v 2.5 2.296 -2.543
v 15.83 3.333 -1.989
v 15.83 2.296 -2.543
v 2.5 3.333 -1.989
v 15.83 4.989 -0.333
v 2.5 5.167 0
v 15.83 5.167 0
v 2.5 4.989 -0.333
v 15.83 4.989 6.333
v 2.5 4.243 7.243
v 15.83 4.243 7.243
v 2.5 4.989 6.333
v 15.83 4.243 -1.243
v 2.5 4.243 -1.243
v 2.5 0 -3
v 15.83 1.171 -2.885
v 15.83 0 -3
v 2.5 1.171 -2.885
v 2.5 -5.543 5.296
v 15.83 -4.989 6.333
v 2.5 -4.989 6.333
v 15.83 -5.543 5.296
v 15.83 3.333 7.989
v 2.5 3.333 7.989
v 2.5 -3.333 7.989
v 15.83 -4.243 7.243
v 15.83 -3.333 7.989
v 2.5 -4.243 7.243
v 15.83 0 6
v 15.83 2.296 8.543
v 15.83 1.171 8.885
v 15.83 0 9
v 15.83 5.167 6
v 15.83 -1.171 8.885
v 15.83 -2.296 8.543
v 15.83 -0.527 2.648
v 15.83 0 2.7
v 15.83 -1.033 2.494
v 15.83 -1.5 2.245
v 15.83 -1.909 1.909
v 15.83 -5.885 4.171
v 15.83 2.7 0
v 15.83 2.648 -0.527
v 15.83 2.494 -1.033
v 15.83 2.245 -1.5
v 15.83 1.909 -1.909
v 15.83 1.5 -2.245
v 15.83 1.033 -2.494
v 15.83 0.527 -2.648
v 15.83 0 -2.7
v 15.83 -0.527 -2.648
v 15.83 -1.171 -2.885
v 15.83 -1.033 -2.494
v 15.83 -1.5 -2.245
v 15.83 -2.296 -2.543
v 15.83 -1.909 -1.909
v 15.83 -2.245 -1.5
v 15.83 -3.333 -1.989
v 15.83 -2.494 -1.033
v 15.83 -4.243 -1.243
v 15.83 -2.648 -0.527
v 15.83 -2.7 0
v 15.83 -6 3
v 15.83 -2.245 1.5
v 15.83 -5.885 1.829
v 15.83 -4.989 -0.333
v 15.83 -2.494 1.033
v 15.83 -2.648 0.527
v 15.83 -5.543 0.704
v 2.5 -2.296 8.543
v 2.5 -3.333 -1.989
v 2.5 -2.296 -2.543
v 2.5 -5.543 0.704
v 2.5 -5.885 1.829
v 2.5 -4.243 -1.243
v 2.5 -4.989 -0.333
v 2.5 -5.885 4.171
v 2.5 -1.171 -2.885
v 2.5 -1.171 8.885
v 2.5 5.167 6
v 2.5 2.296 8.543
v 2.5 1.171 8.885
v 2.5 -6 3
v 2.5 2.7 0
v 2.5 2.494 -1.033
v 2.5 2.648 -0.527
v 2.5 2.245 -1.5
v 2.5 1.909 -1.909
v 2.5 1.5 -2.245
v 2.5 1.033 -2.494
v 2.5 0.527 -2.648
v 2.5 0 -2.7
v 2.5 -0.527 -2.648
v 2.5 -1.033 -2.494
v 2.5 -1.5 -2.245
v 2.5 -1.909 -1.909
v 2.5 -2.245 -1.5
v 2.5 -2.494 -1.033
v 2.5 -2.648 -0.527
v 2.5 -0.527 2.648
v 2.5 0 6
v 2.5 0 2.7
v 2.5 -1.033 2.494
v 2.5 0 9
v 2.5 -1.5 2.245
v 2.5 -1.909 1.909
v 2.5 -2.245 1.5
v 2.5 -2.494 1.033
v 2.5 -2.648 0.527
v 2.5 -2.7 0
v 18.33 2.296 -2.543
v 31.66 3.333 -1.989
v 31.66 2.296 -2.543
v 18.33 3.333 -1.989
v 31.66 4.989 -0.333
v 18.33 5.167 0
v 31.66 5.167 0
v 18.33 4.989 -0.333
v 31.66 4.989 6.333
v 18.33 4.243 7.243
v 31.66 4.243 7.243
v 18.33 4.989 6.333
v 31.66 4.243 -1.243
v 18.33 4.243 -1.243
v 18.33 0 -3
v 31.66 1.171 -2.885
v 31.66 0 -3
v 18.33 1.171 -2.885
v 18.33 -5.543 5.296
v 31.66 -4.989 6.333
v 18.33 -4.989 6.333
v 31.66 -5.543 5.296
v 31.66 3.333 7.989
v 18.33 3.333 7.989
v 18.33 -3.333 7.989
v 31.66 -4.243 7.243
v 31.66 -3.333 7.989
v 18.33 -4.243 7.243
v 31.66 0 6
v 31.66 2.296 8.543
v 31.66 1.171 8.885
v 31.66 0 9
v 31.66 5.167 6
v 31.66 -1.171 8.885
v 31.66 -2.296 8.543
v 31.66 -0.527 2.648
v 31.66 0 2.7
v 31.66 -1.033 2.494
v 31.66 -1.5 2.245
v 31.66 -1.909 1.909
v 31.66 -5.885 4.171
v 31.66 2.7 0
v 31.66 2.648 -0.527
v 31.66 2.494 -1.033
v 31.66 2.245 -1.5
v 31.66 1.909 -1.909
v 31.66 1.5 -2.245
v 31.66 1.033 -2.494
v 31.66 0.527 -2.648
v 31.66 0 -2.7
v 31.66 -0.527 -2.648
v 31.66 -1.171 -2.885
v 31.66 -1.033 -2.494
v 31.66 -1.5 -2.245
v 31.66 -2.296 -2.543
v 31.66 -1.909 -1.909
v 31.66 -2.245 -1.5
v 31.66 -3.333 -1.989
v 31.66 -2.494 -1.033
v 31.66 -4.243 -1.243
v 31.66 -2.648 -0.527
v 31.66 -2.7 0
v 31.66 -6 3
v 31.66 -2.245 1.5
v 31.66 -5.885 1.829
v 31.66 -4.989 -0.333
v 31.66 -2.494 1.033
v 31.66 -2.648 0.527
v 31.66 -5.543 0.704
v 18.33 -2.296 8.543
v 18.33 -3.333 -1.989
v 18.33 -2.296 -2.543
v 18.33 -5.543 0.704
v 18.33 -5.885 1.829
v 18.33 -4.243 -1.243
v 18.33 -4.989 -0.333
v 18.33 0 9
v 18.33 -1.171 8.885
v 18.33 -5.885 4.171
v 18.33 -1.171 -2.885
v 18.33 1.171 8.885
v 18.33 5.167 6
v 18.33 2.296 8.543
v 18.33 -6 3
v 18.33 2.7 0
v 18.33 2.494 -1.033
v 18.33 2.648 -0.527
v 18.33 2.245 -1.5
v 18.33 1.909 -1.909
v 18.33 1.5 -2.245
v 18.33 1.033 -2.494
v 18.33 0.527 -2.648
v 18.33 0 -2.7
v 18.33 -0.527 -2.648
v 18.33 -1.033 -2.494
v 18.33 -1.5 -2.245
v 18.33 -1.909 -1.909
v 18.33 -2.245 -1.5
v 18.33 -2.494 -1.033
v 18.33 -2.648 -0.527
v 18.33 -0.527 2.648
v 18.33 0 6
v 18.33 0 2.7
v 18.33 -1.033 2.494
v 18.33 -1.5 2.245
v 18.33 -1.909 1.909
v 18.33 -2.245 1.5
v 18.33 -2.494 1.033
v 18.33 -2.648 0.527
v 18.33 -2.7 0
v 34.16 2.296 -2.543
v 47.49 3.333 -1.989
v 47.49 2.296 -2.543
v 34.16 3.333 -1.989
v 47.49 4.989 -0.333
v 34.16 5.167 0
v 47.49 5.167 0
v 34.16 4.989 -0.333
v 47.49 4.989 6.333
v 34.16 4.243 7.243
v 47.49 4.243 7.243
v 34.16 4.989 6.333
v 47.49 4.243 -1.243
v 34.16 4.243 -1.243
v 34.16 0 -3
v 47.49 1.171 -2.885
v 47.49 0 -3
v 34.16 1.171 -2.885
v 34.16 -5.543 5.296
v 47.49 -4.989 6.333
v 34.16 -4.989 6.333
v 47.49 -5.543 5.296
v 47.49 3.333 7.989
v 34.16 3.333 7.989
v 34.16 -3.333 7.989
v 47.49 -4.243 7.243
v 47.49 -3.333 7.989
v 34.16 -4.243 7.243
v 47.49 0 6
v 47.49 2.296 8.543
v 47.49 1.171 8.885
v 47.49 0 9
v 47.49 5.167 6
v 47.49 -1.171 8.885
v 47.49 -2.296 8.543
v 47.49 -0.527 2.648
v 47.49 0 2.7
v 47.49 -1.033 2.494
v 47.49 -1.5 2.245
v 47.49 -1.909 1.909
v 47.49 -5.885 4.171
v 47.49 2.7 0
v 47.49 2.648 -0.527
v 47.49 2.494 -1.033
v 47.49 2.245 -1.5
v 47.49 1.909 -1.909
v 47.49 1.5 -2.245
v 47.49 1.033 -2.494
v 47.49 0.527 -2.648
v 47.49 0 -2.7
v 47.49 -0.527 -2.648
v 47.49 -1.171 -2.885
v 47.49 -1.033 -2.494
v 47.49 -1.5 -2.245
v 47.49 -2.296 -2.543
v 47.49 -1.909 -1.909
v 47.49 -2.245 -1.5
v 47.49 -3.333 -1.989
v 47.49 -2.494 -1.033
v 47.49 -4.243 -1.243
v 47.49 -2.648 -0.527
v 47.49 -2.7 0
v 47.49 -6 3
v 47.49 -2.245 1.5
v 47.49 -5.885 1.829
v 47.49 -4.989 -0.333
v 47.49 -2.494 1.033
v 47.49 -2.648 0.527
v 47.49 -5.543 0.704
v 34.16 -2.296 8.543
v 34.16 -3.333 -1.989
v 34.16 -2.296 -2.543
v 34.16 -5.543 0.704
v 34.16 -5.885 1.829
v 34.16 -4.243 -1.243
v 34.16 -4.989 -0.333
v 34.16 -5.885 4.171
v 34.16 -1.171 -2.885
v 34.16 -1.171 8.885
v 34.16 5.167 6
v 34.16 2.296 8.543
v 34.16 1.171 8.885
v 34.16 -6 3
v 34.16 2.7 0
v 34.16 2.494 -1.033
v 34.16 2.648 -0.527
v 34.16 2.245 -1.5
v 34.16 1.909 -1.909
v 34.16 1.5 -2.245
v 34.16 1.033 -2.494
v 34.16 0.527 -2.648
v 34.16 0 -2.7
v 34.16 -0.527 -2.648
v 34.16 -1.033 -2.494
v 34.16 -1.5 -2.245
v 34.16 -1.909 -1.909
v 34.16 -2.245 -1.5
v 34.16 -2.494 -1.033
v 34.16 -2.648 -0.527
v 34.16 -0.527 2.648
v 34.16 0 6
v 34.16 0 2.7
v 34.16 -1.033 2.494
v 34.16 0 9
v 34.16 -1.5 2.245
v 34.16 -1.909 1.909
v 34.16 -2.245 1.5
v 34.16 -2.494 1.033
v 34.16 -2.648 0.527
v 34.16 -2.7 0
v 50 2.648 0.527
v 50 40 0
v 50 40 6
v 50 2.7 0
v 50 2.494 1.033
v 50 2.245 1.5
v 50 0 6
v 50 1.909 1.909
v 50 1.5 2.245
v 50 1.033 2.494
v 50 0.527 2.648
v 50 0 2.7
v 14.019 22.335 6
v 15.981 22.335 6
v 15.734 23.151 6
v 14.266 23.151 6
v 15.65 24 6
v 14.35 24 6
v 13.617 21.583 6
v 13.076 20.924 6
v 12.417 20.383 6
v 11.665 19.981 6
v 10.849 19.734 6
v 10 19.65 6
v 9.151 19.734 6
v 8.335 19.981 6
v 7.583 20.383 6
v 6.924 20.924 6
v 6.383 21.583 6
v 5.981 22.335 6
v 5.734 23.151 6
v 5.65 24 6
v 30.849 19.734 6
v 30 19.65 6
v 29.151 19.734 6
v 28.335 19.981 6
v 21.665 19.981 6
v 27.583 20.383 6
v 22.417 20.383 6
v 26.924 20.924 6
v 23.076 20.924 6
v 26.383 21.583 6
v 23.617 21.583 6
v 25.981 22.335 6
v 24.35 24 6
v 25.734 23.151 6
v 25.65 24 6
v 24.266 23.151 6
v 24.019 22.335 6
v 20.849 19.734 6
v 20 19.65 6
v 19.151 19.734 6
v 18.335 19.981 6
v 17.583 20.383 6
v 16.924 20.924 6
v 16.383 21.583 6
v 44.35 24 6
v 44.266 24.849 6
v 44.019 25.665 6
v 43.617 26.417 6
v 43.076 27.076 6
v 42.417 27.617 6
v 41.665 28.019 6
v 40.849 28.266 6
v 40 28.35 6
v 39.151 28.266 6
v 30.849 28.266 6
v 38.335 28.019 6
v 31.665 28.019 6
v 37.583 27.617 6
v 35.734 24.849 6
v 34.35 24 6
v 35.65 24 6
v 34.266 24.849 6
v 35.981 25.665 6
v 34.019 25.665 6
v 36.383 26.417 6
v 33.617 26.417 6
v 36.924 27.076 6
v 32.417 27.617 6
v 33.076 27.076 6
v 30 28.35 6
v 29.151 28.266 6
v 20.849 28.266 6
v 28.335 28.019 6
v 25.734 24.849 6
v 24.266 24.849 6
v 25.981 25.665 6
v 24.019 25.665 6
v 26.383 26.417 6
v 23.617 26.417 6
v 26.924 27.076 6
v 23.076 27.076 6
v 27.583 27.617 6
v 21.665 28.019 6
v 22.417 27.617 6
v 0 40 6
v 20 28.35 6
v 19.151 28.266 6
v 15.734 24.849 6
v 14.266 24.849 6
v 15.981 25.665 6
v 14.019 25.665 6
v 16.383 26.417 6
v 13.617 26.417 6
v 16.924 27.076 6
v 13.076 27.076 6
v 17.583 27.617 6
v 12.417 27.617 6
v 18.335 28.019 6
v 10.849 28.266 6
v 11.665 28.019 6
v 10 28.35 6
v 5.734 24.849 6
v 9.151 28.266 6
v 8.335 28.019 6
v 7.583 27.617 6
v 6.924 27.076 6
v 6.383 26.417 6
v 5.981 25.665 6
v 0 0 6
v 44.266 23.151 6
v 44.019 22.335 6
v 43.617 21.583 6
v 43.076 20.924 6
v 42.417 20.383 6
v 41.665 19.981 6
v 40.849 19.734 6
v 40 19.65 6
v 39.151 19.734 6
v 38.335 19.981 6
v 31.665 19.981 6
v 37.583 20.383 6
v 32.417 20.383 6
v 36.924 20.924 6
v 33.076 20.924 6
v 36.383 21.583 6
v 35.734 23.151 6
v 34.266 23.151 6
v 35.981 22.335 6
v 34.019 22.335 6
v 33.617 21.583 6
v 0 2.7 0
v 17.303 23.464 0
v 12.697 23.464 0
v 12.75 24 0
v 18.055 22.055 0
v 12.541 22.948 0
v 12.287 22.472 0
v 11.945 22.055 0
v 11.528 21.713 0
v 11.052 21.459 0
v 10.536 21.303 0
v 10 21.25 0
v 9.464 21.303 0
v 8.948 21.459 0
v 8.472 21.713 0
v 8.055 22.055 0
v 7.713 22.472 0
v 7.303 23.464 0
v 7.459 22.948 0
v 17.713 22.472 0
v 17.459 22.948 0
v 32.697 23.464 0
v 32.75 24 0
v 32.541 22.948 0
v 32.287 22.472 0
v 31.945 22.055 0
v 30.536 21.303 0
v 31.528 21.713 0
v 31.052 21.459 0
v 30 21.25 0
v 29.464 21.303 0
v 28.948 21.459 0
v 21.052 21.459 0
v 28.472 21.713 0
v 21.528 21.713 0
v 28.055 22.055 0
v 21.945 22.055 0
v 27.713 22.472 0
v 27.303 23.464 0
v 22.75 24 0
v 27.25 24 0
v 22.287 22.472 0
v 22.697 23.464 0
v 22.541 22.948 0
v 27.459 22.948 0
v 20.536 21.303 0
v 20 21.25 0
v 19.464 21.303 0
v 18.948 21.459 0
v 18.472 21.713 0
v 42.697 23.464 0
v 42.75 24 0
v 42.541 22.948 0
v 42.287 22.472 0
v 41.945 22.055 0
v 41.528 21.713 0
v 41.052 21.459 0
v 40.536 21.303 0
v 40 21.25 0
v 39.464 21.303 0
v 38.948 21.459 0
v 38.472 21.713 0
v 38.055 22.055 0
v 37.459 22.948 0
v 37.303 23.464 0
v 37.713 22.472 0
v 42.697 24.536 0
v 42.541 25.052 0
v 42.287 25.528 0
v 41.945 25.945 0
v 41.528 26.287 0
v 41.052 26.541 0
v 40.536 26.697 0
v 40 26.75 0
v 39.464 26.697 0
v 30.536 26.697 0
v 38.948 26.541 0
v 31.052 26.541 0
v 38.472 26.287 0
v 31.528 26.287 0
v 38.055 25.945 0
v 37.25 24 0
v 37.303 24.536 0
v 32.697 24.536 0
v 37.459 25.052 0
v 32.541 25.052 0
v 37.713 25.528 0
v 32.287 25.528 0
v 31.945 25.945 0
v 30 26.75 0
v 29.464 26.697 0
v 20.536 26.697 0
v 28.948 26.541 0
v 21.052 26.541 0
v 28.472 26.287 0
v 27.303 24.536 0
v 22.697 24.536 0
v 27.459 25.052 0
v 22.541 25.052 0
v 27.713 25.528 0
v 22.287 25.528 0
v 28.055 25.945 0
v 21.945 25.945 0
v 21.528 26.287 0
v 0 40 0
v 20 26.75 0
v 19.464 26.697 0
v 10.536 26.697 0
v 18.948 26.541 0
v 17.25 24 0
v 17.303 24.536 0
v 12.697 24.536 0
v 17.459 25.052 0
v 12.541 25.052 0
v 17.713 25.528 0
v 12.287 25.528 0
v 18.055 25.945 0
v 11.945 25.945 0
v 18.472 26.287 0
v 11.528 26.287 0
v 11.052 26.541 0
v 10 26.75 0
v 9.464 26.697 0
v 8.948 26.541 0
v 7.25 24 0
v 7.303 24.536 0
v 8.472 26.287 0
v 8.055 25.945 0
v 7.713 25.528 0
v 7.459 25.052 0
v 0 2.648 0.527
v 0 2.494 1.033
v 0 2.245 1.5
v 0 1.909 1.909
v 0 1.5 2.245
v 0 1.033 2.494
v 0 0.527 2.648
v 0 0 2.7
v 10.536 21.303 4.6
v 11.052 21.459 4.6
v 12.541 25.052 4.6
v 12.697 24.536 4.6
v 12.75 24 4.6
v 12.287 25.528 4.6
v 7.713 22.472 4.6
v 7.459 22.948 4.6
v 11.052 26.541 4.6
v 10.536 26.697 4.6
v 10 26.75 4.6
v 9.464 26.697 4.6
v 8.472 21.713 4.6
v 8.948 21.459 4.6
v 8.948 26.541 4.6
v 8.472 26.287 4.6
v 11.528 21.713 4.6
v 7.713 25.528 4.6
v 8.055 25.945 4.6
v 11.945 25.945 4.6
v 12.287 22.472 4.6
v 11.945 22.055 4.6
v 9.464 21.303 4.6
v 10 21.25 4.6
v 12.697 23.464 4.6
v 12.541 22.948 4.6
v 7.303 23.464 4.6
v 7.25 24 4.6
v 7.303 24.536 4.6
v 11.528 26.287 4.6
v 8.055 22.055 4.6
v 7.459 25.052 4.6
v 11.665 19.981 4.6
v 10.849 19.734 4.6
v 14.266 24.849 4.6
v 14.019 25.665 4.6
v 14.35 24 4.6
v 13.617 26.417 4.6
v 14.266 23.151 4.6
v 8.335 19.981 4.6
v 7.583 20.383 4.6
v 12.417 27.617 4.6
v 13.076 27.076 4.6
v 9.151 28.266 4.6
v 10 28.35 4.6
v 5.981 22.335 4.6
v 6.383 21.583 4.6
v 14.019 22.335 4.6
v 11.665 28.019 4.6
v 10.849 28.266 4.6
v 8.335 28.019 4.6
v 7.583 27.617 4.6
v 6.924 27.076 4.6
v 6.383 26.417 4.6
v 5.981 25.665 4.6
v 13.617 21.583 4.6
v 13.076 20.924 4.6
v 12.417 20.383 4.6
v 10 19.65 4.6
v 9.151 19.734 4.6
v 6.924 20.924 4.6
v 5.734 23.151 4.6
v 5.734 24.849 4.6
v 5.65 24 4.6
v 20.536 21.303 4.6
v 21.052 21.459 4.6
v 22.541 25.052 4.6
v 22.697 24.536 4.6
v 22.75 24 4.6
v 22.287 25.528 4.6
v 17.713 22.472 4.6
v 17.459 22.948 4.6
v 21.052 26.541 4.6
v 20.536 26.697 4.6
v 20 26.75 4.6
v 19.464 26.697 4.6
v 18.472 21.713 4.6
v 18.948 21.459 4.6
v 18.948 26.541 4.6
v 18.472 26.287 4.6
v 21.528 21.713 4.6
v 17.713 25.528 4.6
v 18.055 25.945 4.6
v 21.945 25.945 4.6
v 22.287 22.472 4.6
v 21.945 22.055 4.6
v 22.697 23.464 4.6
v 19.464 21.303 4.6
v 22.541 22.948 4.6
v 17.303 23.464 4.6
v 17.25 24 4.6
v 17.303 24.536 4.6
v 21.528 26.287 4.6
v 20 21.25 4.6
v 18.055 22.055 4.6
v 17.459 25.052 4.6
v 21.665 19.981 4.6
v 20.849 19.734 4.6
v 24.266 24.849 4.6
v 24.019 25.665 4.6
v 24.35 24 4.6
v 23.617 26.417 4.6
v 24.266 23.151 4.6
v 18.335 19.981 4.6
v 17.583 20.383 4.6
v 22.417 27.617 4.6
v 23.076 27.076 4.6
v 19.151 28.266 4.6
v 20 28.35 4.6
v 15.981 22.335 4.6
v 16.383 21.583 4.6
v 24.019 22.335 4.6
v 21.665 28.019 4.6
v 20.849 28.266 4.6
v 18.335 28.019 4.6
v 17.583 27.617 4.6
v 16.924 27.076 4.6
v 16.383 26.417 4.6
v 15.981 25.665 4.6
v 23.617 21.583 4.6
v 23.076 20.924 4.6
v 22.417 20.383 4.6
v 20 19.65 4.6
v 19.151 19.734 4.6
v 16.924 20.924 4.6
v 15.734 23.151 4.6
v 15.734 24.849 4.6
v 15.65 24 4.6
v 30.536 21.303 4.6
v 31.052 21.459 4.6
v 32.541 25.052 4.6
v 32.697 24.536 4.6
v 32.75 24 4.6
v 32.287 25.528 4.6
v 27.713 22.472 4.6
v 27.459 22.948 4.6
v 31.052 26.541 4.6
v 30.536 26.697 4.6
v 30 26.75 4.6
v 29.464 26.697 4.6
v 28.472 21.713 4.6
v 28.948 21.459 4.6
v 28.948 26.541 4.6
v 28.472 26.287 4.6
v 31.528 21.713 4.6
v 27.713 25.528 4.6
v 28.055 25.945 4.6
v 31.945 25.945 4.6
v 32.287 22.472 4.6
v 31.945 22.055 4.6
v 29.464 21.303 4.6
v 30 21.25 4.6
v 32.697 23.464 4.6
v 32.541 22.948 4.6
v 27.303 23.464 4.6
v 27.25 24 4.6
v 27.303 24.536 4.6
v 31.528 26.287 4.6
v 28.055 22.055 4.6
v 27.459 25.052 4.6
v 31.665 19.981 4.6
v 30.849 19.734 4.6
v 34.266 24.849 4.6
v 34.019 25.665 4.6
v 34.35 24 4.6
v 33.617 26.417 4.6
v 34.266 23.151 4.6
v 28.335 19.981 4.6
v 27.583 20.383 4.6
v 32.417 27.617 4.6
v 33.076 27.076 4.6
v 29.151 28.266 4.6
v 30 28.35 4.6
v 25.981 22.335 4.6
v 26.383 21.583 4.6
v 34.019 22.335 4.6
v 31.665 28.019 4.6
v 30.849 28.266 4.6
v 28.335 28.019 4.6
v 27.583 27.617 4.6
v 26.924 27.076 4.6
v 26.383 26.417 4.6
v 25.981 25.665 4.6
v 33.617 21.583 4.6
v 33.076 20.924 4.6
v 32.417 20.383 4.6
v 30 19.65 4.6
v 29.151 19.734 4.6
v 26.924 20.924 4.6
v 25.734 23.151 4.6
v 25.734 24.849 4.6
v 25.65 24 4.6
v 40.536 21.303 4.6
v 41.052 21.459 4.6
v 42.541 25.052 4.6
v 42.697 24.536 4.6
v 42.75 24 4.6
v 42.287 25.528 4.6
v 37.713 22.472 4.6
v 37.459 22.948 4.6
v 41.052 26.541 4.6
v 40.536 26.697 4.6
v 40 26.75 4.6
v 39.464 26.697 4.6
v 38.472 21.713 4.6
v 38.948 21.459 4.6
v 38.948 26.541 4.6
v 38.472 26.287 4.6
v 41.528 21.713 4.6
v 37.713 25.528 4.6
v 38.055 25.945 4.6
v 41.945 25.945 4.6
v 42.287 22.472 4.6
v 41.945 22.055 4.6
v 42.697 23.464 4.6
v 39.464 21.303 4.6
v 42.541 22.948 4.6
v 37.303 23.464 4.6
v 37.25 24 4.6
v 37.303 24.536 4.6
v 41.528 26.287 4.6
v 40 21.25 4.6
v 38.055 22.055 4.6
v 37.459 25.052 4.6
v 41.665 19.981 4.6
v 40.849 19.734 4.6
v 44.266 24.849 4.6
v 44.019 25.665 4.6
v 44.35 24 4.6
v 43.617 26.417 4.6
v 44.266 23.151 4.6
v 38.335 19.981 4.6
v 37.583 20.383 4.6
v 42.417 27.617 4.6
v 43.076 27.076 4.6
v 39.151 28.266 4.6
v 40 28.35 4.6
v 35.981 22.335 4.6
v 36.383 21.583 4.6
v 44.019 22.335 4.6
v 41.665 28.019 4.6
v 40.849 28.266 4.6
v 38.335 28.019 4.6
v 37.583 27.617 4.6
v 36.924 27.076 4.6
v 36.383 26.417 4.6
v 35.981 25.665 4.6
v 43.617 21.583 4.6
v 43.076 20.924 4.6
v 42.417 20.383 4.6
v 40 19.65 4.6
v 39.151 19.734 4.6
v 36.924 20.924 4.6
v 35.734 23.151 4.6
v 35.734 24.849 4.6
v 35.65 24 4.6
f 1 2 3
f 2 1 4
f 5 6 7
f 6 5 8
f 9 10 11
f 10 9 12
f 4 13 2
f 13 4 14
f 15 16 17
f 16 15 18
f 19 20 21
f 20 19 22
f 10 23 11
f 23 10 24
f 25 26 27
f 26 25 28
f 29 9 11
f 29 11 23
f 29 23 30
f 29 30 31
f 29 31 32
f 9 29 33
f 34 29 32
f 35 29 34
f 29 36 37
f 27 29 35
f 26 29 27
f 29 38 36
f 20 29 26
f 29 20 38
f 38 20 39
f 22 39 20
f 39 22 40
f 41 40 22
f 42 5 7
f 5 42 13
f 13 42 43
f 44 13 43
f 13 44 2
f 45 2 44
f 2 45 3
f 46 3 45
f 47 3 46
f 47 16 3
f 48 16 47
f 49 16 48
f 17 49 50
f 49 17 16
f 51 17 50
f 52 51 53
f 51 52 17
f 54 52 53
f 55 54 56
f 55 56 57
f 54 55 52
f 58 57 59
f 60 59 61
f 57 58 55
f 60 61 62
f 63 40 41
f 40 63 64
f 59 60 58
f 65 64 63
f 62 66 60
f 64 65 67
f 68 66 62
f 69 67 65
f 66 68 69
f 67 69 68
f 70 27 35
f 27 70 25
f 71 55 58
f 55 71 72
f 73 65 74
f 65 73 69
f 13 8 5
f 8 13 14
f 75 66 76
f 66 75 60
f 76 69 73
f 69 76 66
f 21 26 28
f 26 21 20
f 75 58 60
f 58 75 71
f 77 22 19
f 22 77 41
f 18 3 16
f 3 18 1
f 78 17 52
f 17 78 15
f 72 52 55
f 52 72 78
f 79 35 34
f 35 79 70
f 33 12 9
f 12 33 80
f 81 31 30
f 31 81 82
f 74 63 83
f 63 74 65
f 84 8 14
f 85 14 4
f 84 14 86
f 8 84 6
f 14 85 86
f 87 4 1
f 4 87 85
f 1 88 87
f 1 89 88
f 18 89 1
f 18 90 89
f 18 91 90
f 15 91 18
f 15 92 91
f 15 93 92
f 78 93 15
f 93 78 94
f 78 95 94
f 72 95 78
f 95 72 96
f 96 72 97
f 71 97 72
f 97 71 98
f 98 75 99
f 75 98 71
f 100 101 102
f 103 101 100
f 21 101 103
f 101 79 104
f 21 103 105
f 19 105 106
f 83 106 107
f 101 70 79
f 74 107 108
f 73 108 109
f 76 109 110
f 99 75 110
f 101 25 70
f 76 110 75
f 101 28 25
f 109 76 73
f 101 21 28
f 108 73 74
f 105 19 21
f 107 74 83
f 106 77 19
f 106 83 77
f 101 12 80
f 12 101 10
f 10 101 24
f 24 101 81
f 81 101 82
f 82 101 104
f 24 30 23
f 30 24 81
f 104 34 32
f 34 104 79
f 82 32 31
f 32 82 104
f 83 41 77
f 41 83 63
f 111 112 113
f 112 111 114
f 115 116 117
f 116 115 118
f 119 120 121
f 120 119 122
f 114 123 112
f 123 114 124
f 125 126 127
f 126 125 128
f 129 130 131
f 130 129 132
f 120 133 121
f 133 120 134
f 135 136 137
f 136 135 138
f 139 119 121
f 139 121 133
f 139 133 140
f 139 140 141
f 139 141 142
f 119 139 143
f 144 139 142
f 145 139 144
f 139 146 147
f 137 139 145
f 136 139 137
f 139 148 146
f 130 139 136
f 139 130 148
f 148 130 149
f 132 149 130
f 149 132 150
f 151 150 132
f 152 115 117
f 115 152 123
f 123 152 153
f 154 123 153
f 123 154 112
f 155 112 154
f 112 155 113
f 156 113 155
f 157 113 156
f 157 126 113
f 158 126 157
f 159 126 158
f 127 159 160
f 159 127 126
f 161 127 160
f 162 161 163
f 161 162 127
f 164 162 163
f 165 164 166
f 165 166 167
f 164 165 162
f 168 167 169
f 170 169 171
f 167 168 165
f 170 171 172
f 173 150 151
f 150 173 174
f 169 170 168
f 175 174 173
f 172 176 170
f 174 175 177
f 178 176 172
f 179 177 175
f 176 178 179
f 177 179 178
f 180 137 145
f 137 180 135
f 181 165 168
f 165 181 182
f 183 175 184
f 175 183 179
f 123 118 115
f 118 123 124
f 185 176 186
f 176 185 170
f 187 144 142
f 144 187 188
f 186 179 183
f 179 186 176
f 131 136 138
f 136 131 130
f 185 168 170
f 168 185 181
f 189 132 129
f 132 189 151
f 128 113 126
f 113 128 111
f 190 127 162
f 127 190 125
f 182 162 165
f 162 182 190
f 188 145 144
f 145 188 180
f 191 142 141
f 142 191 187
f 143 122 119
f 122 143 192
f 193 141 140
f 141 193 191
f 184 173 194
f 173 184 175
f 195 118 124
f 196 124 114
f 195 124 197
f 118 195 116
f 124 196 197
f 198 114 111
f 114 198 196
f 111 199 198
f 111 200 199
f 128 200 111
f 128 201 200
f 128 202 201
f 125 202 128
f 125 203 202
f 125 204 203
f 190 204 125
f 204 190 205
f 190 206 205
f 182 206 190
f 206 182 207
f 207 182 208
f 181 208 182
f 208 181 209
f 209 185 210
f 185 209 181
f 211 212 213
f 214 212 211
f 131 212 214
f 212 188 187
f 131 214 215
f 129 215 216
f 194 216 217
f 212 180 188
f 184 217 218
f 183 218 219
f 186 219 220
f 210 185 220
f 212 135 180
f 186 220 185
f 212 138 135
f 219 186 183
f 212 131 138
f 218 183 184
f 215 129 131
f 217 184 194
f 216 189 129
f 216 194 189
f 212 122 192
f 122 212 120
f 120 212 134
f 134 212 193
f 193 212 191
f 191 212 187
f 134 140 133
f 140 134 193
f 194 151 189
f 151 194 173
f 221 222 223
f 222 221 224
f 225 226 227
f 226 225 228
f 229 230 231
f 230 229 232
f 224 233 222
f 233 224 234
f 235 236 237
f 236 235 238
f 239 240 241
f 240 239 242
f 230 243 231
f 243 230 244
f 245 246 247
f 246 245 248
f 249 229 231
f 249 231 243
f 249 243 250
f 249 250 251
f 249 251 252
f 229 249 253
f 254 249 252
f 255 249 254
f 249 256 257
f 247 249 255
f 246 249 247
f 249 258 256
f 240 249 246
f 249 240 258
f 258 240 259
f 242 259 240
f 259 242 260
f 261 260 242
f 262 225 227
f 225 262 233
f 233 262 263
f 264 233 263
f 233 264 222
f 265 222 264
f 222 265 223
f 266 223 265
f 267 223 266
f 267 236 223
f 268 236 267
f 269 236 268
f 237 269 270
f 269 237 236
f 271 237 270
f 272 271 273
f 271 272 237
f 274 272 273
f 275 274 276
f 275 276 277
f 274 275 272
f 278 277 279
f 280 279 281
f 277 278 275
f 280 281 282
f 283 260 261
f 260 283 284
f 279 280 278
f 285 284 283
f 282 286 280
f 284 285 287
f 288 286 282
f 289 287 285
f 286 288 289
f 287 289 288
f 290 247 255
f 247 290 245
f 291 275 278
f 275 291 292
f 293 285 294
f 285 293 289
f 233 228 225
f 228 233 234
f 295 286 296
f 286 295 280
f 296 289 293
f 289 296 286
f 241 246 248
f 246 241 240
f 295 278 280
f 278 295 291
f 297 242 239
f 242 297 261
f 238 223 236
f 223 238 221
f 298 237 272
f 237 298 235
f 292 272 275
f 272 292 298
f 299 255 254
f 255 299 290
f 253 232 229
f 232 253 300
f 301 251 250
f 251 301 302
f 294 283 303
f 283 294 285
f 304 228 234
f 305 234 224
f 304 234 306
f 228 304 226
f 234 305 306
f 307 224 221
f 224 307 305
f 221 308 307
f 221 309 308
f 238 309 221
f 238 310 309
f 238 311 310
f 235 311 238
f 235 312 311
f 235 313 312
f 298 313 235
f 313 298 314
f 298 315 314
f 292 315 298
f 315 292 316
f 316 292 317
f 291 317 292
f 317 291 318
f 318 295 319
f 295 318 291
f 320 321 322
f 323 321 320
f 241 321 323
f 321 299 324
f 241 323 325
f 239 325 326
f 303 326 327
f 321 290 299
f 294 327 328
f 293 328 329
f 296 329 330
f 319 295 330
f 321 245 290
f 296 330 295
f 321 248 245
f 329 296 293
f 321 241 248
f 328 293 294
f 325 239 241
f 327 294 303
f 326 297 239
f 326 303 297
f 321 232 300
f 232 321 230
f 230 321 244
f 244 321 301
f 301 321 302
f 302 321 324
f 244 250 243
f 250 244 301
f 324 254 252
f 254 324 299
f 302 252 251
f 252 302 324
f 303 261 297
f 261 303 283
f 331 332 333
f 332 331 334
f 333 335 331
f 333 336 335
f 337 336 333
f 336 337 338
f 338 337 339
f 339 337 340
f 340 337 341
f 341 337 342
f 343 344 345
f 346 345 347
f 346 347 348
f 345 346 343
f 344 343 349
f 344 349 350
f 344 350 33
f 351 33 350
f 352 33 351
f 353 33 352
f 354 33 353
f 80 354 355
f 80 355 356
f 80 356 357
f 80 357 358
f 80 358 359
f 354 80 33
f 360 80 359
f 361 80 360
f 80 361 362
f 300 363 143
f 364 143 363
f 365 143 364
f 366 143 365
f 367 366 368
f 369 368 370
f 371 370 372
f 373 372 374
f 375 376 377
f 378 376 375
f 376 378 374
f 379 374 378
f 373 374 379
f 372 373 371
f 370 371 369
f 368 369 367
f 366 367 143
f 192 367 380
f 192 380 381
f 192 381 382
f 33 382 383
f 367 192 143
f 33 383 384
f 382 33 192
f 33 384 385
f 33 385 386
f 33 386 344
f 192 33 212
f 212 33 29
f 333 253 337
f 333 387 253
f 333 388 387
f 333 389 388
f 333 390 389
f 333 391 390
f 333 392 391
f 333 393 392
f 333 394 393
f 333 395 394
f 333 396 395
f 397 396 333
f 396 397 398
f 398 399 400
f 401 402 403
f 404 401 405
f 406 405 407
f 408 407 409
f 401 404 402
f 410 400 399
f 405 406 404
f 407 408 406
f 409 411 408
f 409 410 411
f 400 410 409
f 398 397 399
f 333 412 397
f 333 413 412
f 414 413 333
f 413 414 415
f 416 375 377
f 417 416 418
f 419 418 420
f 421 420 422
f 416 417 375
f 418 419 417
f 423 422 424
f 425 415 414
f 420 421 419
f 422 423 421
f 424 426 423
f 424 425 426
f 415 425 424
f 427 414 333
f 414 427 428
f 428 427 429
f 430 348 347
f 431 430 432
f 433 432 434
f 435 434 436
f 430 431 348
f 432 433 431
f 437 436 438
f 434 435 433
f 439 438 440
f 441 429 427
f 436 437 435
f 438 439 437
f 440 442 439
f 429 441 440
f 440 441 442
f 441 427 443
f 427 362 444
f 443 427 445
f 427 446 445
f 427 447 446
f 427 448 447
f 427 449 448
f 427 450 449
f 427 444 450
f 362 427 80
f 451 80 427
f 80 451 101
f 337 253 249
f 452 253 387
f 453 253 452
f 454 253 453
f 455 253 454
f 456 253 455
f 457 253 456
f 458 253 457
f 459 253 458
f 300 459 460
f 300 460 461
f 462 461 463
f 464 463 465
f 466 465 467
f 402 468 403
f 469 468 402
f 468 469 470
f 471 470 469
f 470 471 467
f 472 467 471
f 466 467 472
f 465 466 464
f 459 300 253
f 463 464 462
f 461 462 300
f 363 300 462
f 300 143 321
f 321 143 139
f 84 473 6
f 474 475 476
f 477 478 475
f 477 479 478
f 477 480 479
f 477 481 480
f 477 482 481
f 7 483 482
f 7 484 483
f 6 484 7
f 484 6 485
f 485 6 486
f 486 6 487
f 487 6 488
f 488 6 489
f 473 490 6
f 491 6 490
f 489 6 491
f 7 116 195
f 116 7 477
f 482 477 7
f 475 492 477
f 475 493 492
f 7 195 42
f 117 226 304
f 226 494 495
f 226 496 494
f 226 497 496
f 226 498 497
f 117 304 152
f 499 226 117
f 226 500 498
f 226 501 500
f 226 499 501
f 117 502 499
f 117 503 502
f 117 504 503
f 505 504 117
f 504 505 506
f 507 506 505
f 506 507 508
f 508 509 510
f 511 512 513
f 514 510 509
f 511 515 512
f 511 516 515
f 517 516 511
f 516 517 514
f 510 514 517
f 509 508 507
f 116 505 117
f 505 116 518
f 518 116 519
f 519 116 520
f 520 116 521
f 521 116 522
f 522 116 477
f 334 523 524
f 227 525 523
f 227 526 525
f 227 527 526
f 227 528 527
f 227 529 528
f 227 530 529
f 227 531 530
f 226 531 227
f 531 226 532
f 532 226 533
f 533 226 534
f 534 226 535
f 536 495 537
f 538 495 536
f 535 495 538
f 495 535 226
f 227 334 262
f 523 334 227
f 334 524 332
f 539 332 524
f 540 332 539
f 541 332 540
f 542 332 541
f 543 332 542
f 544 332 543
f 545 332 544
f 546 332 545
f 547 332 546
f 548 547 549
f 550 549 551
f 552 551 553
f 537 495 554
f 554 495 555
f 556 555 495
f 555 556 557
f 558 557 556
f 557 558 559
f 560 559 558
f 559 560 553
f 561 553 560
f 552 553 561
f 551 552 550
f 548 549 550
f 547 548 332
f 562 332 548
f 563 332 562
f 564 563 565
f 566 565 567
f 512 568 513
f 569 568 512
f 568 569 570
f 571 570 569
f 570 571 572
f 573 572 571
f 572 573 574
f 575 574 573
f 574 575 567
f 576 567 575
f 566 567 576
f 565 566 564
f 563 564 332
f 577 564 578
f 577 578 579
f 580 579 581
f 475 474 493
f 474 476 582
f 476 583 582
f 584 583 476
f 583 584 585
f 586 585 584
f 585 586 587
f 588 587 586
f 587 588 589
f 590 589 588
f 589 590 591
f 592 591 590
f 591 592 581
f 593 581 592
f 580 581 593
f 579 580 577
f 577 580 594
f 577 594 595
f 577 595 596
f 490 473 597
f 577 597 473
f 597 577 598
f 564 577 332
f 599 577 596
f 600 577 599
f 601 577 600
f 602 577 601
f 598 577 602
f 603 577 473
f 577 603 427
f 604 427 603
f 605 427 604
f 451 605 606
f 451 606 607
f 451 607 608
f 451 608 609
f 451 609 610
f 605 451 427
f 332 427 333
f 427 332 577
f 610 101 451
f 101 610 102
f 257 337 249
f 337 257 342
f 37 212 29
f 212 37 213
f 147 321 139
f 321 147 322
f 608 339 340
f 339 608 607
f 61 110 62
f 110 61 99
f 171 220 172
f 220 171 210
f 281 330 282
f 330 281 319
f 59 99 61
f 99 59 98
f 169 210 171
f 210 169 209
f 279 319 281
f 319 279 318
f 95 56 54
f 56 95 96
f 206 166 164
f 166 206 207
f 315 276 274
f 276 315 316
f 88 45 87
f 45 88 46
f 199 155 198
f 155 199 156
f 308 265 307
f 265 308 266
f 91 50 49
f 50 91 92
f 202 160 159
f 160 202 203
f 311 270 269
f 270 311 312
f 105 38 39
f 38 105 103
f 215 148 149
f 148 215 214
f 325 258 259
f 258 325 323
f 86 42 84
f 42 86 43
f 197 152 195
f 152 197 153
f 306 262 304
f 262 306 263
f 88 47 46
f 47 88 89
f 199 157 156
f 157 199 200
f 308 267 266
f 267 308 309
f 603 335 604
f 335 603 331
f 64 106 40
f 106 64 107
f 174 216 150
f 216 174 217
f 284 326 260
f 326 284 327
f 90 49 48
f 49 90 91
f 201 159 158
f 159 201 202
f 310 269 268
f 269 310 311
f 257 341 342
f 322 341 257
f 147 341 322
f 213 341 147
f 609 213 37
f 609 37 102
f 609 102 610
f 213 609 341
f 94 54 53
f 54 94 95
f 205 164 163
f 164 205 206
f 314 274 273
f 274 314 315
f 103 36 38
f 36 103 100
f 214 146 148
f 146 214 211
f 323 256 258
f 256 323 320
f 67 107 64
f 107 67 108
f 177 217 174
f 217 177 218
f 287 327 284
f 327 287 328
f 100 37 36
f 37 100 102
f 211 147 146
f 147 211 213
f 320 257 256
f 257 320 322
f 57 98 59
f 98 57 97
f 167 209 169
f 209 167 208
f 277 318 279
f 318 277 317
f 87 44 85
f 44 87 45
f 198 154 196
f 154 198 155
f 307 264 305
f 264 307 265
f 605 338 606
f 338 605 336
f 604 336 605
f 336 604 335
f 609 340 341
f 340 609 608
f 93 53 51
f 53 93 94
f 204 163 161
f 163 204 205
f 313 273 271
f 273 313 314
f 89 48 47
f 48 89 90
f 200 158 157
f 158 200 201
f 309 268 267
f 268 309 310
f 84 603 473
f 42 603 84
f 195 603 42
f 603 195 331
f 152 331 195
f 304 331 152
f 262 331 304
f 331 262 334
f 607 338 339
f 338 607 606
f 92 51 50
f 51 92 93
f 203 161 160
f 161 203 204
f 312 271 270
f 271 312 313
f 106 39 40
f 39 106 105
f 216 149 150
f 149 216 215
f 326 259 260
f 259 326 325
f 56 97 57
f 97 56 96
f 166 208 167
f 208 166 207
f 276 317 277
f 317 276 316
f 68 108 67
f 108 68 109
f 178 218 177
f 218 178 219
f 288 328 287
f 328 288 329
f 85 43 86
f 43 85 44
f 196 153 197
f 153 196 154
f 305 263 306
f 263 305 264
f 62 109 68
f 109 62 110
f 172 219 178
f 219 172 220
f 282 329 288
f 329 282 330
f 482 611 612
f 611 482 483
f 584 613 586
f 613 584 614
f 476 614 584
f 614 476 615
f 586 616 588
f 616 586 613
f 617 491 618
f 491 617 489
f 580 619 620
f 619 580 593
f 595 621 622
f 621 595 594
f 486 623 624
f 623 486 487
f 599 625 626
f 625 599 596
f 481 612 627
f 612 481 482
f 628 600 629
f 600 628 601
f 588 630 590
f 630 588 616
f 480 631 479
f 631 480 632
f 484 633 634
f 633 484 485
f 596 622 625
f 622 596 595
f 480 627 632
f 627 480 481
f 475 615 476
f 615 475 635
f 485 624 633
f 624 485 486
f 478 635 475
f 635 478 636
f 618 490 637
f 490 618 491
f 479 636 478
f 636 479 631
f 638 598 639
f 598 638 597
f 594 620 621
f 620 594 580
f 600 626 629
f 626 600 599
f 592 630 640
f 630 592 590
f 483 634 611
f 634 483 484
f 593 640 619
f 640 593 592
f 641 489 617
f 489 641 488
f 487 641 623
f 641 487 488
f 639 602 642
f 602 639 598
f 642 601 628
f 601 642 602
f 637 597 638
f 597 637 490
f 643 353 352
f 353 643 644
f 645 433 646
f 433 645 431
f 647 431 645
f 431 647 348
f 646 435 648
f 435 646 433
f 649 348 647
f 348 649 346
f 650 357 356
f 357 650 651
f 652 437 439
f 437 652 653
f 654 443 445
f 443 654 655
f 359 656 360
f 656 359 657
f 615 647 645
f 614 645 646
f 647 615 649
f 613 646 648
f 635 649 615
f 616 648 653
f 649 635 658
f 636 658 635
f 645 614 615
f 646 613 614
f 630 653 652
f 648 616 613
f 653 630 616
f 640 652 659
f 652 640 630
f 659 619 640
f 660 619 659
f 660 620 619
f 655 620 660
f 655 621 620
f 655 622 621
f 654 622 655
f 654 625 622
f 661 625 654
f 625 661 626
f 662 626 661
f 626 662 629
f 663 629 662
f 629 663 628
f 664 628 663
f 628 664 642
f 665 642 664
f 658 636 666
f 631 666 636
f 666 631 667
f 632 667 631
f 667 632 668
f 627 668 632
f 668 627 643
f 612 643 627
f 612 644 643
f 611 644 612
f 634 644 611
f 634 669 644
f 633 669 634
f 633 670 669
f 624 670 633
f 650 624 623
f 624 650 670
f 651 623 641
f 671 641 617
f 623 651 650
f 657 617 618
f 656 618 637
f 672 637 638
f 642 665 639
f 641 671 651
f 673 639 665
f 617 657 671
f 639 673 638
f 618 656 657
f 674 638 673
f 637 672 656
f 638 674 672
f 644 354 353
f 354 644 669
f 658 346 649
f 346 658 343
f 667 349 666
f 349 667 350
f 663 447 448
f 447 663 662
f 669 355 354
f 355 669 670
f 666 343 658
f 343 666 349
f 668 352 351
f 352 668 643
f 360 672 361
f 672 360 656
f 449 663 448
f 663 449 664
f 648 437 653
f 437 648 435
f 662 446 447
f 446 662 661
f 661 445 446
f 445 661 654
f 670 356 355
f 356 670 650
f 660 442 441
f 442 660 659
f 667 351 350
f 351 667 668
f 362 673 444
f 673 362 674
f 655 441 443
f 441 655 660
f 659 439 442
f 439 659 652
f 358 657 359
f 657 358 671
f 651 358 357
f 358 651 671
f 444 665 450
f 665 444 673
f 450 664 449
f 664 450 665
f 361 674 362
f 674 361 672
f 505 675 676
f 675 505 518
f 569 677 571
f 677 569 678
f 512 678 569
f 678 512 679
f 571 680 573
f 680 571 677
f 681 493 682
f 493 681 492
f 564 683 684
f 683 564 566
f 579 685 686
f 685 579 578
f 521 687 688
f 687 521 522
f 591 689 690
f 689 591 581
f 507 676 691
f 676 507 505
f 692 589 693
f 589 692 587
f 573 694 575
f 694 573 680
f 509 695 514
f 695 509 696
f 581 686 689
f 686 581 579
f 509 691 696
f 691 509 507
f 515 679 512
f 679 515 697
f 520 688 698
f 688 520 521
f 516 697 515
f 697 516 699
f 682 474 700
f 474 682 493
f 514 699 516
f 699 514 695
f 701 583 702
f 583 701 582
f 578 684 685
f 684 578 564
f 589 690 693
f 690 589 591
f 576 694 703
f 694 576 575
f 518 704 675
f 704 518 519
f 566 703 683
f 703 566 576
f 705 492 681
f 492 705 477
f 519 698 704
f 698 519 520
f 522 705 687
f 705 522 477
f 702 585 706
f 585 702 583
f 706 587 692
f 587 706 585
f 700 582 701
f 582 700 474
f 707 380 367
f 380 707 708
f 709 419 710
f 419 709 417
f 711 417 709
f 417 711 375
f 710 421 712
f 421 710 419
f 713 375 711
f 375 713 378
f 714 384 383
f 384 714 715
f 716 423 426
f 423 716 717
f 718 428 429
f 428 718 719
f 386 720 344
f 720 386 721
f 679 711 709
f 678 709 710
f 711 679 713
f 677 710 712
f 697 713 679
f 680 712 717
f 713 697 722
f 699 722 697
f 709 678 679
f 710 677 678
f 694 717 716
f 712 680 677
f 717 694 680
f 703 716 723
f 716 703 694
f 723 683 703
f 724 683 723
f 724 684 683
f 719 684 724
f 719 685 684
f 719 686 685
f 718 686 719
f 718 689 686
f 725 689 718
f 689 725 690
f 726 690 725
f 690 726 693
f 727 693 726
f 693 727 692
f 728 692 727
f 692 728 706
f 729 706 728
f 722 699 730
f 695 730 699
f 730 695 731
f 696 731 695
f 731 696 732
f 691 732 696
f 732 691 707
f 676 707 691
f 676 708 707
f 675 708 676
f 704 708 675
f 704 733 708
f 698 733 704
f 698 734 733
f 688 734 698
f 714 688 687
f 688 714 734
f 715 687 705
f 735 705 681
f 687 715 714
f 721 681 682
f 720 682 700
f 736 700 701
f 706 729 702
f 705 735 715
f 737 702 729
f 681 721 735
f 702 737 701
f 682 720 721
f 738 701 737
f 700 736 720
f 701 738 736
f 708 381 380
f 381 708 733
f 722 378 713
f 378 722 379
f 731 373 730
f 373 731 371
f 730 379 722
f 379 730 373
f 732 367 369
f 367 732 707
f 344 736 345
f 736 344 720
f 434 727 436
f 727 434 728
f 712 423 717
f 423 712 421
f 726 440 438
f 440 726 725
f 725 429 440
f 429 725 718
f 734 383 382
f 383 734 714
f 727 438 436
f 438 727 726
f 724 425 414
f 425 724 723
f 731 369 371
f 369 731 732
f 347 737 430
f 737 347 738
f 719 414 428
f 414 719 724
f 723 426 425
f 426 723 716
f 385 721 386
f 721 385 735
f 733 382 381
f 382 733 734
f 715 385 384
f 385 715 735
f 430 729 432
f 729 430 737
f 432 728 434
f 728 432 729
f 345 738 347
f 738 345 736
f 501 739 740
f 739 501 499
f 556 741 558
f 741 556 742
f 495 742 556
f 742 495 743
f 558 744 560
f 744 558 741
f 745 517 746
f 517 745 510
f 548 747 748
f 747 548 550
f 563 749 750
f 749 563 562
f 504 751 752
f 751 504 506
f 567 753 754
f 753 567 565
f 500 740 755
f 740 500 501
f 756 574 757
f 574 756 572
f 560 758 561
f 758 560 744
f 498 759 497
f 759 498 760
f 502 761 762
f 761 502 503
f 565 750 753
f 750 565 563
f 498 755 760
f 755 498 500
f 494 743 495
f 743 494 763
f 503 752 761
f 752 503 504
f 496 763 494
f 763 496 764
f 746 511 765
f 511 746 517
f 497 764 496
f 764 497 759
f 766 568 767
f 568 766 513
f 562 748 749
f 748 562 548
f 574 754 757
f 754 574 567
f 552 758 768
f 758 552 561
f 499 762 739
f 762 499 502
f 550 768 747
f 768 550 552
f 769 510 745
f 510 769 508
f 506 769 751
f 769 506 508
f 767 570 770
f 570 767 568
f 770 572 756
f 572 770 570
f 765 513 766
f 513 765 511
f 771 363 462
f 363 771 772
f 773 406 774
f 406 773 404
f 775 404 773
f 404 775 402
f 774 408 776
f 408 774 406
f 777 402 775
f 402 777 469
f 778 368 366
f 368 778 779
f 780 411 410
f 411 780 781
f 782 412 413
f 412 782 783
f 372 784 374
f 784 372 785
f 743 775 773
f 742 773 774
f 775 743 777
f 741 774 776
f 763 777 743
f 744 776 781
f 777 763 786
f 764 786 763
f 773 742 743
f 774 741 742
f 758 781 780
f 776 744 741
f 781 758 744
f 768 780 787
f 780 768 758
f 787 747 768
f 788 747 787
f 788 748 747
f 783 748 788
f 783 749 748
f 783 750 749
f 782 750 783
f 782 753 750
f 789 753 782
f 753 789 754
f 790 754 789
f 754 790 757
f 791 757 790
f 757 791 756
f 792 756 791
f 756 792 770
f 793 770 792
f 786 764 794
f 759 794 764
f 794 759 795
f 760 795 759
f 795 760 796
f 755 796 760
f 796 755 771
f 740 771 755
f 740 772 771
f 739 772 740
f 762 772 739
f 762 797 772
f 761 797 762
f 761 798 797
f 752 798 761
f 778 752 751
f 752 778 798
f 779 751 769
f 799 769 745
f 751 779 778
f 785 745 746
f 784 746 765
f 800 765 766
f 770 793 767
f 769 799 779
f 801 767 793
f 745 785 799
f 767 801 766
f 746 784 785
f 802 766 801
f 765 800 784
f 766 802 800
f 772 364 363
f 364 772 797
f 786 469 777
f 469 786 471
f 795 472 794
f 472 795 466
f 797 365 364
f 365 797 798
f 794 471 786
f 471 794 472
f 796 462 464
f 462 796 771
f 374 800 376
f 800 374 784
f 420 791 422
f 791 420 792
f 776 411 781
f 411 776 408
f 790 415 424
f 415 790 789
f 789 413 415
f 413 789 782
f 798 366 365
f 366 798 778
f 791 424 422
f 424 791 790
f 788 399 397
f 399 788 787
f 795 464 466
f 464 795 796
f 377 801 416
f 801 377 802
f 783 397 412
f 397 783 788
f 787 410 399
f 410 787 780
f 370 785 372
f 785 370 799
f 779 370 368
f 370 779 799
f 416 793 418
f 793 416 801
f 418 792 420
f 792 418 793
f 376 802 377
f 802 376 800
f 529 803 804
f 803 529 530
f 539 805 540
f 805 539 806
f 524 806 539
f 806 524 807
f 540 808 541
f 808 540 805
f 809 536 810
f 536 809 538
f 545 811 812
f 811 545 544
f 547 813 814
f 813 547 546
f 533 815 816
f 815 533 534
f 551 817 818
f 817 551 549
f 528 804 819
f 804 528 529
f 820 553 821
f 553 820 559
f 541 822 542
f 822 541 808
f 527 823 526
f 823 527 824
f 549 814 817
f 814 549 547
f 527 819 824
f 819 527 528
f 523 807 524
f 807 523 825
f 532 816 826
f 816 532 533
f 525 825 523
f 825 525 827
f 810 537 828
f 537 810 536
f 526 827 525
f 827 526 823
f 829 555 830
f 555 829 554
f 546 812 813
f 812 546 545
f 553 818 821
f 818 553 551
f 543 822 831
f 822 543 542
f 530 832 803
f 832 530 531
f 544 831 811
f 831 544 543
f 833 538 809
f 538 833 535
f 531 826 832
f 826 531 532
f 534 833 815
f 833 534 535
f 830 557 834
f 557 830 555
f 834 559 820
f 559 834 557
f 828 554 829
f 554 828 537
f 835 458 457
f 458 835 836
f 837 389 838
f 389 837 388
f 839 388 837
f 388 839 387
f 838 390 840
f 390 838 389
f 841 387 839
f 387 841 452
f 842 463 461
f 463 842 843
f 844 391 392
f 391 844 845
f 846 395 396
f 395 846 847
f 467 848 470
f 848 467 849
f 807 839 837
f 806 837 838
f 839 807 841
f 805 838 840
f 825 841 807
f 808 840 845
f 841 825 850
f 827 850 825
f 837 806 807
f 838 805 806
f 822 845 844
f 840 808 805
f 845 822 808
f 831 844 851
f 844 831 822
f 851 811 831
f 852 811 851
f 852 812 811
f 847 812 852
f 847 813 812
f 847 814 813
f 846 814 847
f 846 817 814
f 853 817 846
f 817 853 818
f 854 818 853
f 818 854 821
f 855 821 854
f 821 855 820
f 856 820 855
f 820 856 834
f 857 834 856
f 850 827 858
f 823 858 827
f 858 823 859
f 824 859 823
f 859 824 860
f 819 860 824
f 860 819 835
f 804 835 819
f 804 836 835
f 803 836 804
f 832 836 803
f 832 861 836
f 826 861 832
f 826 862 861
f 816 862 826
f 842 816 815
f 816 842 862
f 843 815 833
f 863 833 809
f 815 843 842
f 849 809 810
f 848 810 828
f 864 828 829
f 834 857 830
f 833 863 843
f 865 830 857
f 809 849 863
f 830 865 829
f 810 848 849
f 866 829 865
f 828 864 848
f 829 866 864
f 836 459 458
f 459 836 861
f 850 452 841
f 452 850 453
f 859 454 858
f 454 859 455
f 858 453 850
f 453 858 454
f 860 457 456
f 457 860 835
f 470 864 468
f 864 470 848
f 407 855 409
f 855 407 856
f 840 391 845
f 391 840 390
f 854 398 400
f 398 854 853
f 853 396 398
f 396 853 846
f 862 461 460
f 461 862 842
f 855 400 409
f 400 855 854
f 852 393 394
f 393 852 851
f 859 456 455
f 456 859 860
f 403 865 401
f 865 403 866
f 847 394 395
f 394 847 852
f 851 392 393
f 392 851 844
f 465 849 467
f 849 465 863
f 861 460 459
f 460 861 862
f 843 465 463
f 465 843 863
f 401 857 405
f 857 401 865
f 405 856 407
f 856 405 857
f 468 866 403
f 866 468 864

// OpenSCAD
$fn = 32;

// ----------------------------------------------------------------------
// Hinge leaf: 50 x 46 x 12 mm
// ----------------------------------------------------------------------

// --- parameters (mm) ---
tab_len = 50;             // leaf length, X
tab_w = 40;               // leaf width, Y
tab_t = 6;                // leaf thickness
ring_d = 12;              // knuckle diameter
ring_w = 13.33;           // knuckle width
knuckle_n = 3;            // number of knuckles
pin_d = 5.4;              // pin bore
gap = 2.5;                // gap between the knuckles
screw_d = 5.5;            // screw clearance
cs_d = 8.7;               // countersink diameter
cs_h = 1.4;               // countersink depth

module leaf() {
  cube([tab_len, tab_w, tab_t]);
}

module knuckles() {
  /* barrels sit on the leaf edge, the pin axis at half the leaf thickness */
  for (i = [0 : knuckle_n - 1])
    translate([gap + i * (ring_w + gap), 0, tab_t * 0.5])
      rotate([0, 90, 0]) cylinder(h = ring_w, d = ring_d);
}

difference() {
  union() {
    leaf();
    knuckles();
  }
  rotate([0, 90, 0]) translate([0, 0, -1])
    cylinder(h = tab_len + 2, d = pin_d);
  translate([10, tab_w * 0.6, -1]) cylinder(h = tab_t + 2, d = screw_d);
  translate([10, tab_w * 0.6, tab_t - cs_h]) cylinder(h = cs_h + 0.5, d = cs_d);
  translate([20, tab_w * 0.6, -1]) cylinder(h = tab_t + 2, d = screw_d);
  translate([20, tab_w * 0.6, tab_t - cs_h]) cylinder(h = cs_h + 0.5, d = cs_d);
  translate([30, tab_w * 0.6, -1]) cylinder(h = tab_t + 2, d = screw_d);
  translate([30, tab_w * 0.6, tab_t - cs_h]) cylinder(h = cs_h + 0.5, d = cs_d);
  translate([40, tab_w * 0.6, -1]) cylinder(h = tab_t + 2, d = screw_d);
  translate([40, tab_w * 0.6, tab_t - cs_h]) cylinder(h = cs_h + 0.5, d = cs_d);
}
